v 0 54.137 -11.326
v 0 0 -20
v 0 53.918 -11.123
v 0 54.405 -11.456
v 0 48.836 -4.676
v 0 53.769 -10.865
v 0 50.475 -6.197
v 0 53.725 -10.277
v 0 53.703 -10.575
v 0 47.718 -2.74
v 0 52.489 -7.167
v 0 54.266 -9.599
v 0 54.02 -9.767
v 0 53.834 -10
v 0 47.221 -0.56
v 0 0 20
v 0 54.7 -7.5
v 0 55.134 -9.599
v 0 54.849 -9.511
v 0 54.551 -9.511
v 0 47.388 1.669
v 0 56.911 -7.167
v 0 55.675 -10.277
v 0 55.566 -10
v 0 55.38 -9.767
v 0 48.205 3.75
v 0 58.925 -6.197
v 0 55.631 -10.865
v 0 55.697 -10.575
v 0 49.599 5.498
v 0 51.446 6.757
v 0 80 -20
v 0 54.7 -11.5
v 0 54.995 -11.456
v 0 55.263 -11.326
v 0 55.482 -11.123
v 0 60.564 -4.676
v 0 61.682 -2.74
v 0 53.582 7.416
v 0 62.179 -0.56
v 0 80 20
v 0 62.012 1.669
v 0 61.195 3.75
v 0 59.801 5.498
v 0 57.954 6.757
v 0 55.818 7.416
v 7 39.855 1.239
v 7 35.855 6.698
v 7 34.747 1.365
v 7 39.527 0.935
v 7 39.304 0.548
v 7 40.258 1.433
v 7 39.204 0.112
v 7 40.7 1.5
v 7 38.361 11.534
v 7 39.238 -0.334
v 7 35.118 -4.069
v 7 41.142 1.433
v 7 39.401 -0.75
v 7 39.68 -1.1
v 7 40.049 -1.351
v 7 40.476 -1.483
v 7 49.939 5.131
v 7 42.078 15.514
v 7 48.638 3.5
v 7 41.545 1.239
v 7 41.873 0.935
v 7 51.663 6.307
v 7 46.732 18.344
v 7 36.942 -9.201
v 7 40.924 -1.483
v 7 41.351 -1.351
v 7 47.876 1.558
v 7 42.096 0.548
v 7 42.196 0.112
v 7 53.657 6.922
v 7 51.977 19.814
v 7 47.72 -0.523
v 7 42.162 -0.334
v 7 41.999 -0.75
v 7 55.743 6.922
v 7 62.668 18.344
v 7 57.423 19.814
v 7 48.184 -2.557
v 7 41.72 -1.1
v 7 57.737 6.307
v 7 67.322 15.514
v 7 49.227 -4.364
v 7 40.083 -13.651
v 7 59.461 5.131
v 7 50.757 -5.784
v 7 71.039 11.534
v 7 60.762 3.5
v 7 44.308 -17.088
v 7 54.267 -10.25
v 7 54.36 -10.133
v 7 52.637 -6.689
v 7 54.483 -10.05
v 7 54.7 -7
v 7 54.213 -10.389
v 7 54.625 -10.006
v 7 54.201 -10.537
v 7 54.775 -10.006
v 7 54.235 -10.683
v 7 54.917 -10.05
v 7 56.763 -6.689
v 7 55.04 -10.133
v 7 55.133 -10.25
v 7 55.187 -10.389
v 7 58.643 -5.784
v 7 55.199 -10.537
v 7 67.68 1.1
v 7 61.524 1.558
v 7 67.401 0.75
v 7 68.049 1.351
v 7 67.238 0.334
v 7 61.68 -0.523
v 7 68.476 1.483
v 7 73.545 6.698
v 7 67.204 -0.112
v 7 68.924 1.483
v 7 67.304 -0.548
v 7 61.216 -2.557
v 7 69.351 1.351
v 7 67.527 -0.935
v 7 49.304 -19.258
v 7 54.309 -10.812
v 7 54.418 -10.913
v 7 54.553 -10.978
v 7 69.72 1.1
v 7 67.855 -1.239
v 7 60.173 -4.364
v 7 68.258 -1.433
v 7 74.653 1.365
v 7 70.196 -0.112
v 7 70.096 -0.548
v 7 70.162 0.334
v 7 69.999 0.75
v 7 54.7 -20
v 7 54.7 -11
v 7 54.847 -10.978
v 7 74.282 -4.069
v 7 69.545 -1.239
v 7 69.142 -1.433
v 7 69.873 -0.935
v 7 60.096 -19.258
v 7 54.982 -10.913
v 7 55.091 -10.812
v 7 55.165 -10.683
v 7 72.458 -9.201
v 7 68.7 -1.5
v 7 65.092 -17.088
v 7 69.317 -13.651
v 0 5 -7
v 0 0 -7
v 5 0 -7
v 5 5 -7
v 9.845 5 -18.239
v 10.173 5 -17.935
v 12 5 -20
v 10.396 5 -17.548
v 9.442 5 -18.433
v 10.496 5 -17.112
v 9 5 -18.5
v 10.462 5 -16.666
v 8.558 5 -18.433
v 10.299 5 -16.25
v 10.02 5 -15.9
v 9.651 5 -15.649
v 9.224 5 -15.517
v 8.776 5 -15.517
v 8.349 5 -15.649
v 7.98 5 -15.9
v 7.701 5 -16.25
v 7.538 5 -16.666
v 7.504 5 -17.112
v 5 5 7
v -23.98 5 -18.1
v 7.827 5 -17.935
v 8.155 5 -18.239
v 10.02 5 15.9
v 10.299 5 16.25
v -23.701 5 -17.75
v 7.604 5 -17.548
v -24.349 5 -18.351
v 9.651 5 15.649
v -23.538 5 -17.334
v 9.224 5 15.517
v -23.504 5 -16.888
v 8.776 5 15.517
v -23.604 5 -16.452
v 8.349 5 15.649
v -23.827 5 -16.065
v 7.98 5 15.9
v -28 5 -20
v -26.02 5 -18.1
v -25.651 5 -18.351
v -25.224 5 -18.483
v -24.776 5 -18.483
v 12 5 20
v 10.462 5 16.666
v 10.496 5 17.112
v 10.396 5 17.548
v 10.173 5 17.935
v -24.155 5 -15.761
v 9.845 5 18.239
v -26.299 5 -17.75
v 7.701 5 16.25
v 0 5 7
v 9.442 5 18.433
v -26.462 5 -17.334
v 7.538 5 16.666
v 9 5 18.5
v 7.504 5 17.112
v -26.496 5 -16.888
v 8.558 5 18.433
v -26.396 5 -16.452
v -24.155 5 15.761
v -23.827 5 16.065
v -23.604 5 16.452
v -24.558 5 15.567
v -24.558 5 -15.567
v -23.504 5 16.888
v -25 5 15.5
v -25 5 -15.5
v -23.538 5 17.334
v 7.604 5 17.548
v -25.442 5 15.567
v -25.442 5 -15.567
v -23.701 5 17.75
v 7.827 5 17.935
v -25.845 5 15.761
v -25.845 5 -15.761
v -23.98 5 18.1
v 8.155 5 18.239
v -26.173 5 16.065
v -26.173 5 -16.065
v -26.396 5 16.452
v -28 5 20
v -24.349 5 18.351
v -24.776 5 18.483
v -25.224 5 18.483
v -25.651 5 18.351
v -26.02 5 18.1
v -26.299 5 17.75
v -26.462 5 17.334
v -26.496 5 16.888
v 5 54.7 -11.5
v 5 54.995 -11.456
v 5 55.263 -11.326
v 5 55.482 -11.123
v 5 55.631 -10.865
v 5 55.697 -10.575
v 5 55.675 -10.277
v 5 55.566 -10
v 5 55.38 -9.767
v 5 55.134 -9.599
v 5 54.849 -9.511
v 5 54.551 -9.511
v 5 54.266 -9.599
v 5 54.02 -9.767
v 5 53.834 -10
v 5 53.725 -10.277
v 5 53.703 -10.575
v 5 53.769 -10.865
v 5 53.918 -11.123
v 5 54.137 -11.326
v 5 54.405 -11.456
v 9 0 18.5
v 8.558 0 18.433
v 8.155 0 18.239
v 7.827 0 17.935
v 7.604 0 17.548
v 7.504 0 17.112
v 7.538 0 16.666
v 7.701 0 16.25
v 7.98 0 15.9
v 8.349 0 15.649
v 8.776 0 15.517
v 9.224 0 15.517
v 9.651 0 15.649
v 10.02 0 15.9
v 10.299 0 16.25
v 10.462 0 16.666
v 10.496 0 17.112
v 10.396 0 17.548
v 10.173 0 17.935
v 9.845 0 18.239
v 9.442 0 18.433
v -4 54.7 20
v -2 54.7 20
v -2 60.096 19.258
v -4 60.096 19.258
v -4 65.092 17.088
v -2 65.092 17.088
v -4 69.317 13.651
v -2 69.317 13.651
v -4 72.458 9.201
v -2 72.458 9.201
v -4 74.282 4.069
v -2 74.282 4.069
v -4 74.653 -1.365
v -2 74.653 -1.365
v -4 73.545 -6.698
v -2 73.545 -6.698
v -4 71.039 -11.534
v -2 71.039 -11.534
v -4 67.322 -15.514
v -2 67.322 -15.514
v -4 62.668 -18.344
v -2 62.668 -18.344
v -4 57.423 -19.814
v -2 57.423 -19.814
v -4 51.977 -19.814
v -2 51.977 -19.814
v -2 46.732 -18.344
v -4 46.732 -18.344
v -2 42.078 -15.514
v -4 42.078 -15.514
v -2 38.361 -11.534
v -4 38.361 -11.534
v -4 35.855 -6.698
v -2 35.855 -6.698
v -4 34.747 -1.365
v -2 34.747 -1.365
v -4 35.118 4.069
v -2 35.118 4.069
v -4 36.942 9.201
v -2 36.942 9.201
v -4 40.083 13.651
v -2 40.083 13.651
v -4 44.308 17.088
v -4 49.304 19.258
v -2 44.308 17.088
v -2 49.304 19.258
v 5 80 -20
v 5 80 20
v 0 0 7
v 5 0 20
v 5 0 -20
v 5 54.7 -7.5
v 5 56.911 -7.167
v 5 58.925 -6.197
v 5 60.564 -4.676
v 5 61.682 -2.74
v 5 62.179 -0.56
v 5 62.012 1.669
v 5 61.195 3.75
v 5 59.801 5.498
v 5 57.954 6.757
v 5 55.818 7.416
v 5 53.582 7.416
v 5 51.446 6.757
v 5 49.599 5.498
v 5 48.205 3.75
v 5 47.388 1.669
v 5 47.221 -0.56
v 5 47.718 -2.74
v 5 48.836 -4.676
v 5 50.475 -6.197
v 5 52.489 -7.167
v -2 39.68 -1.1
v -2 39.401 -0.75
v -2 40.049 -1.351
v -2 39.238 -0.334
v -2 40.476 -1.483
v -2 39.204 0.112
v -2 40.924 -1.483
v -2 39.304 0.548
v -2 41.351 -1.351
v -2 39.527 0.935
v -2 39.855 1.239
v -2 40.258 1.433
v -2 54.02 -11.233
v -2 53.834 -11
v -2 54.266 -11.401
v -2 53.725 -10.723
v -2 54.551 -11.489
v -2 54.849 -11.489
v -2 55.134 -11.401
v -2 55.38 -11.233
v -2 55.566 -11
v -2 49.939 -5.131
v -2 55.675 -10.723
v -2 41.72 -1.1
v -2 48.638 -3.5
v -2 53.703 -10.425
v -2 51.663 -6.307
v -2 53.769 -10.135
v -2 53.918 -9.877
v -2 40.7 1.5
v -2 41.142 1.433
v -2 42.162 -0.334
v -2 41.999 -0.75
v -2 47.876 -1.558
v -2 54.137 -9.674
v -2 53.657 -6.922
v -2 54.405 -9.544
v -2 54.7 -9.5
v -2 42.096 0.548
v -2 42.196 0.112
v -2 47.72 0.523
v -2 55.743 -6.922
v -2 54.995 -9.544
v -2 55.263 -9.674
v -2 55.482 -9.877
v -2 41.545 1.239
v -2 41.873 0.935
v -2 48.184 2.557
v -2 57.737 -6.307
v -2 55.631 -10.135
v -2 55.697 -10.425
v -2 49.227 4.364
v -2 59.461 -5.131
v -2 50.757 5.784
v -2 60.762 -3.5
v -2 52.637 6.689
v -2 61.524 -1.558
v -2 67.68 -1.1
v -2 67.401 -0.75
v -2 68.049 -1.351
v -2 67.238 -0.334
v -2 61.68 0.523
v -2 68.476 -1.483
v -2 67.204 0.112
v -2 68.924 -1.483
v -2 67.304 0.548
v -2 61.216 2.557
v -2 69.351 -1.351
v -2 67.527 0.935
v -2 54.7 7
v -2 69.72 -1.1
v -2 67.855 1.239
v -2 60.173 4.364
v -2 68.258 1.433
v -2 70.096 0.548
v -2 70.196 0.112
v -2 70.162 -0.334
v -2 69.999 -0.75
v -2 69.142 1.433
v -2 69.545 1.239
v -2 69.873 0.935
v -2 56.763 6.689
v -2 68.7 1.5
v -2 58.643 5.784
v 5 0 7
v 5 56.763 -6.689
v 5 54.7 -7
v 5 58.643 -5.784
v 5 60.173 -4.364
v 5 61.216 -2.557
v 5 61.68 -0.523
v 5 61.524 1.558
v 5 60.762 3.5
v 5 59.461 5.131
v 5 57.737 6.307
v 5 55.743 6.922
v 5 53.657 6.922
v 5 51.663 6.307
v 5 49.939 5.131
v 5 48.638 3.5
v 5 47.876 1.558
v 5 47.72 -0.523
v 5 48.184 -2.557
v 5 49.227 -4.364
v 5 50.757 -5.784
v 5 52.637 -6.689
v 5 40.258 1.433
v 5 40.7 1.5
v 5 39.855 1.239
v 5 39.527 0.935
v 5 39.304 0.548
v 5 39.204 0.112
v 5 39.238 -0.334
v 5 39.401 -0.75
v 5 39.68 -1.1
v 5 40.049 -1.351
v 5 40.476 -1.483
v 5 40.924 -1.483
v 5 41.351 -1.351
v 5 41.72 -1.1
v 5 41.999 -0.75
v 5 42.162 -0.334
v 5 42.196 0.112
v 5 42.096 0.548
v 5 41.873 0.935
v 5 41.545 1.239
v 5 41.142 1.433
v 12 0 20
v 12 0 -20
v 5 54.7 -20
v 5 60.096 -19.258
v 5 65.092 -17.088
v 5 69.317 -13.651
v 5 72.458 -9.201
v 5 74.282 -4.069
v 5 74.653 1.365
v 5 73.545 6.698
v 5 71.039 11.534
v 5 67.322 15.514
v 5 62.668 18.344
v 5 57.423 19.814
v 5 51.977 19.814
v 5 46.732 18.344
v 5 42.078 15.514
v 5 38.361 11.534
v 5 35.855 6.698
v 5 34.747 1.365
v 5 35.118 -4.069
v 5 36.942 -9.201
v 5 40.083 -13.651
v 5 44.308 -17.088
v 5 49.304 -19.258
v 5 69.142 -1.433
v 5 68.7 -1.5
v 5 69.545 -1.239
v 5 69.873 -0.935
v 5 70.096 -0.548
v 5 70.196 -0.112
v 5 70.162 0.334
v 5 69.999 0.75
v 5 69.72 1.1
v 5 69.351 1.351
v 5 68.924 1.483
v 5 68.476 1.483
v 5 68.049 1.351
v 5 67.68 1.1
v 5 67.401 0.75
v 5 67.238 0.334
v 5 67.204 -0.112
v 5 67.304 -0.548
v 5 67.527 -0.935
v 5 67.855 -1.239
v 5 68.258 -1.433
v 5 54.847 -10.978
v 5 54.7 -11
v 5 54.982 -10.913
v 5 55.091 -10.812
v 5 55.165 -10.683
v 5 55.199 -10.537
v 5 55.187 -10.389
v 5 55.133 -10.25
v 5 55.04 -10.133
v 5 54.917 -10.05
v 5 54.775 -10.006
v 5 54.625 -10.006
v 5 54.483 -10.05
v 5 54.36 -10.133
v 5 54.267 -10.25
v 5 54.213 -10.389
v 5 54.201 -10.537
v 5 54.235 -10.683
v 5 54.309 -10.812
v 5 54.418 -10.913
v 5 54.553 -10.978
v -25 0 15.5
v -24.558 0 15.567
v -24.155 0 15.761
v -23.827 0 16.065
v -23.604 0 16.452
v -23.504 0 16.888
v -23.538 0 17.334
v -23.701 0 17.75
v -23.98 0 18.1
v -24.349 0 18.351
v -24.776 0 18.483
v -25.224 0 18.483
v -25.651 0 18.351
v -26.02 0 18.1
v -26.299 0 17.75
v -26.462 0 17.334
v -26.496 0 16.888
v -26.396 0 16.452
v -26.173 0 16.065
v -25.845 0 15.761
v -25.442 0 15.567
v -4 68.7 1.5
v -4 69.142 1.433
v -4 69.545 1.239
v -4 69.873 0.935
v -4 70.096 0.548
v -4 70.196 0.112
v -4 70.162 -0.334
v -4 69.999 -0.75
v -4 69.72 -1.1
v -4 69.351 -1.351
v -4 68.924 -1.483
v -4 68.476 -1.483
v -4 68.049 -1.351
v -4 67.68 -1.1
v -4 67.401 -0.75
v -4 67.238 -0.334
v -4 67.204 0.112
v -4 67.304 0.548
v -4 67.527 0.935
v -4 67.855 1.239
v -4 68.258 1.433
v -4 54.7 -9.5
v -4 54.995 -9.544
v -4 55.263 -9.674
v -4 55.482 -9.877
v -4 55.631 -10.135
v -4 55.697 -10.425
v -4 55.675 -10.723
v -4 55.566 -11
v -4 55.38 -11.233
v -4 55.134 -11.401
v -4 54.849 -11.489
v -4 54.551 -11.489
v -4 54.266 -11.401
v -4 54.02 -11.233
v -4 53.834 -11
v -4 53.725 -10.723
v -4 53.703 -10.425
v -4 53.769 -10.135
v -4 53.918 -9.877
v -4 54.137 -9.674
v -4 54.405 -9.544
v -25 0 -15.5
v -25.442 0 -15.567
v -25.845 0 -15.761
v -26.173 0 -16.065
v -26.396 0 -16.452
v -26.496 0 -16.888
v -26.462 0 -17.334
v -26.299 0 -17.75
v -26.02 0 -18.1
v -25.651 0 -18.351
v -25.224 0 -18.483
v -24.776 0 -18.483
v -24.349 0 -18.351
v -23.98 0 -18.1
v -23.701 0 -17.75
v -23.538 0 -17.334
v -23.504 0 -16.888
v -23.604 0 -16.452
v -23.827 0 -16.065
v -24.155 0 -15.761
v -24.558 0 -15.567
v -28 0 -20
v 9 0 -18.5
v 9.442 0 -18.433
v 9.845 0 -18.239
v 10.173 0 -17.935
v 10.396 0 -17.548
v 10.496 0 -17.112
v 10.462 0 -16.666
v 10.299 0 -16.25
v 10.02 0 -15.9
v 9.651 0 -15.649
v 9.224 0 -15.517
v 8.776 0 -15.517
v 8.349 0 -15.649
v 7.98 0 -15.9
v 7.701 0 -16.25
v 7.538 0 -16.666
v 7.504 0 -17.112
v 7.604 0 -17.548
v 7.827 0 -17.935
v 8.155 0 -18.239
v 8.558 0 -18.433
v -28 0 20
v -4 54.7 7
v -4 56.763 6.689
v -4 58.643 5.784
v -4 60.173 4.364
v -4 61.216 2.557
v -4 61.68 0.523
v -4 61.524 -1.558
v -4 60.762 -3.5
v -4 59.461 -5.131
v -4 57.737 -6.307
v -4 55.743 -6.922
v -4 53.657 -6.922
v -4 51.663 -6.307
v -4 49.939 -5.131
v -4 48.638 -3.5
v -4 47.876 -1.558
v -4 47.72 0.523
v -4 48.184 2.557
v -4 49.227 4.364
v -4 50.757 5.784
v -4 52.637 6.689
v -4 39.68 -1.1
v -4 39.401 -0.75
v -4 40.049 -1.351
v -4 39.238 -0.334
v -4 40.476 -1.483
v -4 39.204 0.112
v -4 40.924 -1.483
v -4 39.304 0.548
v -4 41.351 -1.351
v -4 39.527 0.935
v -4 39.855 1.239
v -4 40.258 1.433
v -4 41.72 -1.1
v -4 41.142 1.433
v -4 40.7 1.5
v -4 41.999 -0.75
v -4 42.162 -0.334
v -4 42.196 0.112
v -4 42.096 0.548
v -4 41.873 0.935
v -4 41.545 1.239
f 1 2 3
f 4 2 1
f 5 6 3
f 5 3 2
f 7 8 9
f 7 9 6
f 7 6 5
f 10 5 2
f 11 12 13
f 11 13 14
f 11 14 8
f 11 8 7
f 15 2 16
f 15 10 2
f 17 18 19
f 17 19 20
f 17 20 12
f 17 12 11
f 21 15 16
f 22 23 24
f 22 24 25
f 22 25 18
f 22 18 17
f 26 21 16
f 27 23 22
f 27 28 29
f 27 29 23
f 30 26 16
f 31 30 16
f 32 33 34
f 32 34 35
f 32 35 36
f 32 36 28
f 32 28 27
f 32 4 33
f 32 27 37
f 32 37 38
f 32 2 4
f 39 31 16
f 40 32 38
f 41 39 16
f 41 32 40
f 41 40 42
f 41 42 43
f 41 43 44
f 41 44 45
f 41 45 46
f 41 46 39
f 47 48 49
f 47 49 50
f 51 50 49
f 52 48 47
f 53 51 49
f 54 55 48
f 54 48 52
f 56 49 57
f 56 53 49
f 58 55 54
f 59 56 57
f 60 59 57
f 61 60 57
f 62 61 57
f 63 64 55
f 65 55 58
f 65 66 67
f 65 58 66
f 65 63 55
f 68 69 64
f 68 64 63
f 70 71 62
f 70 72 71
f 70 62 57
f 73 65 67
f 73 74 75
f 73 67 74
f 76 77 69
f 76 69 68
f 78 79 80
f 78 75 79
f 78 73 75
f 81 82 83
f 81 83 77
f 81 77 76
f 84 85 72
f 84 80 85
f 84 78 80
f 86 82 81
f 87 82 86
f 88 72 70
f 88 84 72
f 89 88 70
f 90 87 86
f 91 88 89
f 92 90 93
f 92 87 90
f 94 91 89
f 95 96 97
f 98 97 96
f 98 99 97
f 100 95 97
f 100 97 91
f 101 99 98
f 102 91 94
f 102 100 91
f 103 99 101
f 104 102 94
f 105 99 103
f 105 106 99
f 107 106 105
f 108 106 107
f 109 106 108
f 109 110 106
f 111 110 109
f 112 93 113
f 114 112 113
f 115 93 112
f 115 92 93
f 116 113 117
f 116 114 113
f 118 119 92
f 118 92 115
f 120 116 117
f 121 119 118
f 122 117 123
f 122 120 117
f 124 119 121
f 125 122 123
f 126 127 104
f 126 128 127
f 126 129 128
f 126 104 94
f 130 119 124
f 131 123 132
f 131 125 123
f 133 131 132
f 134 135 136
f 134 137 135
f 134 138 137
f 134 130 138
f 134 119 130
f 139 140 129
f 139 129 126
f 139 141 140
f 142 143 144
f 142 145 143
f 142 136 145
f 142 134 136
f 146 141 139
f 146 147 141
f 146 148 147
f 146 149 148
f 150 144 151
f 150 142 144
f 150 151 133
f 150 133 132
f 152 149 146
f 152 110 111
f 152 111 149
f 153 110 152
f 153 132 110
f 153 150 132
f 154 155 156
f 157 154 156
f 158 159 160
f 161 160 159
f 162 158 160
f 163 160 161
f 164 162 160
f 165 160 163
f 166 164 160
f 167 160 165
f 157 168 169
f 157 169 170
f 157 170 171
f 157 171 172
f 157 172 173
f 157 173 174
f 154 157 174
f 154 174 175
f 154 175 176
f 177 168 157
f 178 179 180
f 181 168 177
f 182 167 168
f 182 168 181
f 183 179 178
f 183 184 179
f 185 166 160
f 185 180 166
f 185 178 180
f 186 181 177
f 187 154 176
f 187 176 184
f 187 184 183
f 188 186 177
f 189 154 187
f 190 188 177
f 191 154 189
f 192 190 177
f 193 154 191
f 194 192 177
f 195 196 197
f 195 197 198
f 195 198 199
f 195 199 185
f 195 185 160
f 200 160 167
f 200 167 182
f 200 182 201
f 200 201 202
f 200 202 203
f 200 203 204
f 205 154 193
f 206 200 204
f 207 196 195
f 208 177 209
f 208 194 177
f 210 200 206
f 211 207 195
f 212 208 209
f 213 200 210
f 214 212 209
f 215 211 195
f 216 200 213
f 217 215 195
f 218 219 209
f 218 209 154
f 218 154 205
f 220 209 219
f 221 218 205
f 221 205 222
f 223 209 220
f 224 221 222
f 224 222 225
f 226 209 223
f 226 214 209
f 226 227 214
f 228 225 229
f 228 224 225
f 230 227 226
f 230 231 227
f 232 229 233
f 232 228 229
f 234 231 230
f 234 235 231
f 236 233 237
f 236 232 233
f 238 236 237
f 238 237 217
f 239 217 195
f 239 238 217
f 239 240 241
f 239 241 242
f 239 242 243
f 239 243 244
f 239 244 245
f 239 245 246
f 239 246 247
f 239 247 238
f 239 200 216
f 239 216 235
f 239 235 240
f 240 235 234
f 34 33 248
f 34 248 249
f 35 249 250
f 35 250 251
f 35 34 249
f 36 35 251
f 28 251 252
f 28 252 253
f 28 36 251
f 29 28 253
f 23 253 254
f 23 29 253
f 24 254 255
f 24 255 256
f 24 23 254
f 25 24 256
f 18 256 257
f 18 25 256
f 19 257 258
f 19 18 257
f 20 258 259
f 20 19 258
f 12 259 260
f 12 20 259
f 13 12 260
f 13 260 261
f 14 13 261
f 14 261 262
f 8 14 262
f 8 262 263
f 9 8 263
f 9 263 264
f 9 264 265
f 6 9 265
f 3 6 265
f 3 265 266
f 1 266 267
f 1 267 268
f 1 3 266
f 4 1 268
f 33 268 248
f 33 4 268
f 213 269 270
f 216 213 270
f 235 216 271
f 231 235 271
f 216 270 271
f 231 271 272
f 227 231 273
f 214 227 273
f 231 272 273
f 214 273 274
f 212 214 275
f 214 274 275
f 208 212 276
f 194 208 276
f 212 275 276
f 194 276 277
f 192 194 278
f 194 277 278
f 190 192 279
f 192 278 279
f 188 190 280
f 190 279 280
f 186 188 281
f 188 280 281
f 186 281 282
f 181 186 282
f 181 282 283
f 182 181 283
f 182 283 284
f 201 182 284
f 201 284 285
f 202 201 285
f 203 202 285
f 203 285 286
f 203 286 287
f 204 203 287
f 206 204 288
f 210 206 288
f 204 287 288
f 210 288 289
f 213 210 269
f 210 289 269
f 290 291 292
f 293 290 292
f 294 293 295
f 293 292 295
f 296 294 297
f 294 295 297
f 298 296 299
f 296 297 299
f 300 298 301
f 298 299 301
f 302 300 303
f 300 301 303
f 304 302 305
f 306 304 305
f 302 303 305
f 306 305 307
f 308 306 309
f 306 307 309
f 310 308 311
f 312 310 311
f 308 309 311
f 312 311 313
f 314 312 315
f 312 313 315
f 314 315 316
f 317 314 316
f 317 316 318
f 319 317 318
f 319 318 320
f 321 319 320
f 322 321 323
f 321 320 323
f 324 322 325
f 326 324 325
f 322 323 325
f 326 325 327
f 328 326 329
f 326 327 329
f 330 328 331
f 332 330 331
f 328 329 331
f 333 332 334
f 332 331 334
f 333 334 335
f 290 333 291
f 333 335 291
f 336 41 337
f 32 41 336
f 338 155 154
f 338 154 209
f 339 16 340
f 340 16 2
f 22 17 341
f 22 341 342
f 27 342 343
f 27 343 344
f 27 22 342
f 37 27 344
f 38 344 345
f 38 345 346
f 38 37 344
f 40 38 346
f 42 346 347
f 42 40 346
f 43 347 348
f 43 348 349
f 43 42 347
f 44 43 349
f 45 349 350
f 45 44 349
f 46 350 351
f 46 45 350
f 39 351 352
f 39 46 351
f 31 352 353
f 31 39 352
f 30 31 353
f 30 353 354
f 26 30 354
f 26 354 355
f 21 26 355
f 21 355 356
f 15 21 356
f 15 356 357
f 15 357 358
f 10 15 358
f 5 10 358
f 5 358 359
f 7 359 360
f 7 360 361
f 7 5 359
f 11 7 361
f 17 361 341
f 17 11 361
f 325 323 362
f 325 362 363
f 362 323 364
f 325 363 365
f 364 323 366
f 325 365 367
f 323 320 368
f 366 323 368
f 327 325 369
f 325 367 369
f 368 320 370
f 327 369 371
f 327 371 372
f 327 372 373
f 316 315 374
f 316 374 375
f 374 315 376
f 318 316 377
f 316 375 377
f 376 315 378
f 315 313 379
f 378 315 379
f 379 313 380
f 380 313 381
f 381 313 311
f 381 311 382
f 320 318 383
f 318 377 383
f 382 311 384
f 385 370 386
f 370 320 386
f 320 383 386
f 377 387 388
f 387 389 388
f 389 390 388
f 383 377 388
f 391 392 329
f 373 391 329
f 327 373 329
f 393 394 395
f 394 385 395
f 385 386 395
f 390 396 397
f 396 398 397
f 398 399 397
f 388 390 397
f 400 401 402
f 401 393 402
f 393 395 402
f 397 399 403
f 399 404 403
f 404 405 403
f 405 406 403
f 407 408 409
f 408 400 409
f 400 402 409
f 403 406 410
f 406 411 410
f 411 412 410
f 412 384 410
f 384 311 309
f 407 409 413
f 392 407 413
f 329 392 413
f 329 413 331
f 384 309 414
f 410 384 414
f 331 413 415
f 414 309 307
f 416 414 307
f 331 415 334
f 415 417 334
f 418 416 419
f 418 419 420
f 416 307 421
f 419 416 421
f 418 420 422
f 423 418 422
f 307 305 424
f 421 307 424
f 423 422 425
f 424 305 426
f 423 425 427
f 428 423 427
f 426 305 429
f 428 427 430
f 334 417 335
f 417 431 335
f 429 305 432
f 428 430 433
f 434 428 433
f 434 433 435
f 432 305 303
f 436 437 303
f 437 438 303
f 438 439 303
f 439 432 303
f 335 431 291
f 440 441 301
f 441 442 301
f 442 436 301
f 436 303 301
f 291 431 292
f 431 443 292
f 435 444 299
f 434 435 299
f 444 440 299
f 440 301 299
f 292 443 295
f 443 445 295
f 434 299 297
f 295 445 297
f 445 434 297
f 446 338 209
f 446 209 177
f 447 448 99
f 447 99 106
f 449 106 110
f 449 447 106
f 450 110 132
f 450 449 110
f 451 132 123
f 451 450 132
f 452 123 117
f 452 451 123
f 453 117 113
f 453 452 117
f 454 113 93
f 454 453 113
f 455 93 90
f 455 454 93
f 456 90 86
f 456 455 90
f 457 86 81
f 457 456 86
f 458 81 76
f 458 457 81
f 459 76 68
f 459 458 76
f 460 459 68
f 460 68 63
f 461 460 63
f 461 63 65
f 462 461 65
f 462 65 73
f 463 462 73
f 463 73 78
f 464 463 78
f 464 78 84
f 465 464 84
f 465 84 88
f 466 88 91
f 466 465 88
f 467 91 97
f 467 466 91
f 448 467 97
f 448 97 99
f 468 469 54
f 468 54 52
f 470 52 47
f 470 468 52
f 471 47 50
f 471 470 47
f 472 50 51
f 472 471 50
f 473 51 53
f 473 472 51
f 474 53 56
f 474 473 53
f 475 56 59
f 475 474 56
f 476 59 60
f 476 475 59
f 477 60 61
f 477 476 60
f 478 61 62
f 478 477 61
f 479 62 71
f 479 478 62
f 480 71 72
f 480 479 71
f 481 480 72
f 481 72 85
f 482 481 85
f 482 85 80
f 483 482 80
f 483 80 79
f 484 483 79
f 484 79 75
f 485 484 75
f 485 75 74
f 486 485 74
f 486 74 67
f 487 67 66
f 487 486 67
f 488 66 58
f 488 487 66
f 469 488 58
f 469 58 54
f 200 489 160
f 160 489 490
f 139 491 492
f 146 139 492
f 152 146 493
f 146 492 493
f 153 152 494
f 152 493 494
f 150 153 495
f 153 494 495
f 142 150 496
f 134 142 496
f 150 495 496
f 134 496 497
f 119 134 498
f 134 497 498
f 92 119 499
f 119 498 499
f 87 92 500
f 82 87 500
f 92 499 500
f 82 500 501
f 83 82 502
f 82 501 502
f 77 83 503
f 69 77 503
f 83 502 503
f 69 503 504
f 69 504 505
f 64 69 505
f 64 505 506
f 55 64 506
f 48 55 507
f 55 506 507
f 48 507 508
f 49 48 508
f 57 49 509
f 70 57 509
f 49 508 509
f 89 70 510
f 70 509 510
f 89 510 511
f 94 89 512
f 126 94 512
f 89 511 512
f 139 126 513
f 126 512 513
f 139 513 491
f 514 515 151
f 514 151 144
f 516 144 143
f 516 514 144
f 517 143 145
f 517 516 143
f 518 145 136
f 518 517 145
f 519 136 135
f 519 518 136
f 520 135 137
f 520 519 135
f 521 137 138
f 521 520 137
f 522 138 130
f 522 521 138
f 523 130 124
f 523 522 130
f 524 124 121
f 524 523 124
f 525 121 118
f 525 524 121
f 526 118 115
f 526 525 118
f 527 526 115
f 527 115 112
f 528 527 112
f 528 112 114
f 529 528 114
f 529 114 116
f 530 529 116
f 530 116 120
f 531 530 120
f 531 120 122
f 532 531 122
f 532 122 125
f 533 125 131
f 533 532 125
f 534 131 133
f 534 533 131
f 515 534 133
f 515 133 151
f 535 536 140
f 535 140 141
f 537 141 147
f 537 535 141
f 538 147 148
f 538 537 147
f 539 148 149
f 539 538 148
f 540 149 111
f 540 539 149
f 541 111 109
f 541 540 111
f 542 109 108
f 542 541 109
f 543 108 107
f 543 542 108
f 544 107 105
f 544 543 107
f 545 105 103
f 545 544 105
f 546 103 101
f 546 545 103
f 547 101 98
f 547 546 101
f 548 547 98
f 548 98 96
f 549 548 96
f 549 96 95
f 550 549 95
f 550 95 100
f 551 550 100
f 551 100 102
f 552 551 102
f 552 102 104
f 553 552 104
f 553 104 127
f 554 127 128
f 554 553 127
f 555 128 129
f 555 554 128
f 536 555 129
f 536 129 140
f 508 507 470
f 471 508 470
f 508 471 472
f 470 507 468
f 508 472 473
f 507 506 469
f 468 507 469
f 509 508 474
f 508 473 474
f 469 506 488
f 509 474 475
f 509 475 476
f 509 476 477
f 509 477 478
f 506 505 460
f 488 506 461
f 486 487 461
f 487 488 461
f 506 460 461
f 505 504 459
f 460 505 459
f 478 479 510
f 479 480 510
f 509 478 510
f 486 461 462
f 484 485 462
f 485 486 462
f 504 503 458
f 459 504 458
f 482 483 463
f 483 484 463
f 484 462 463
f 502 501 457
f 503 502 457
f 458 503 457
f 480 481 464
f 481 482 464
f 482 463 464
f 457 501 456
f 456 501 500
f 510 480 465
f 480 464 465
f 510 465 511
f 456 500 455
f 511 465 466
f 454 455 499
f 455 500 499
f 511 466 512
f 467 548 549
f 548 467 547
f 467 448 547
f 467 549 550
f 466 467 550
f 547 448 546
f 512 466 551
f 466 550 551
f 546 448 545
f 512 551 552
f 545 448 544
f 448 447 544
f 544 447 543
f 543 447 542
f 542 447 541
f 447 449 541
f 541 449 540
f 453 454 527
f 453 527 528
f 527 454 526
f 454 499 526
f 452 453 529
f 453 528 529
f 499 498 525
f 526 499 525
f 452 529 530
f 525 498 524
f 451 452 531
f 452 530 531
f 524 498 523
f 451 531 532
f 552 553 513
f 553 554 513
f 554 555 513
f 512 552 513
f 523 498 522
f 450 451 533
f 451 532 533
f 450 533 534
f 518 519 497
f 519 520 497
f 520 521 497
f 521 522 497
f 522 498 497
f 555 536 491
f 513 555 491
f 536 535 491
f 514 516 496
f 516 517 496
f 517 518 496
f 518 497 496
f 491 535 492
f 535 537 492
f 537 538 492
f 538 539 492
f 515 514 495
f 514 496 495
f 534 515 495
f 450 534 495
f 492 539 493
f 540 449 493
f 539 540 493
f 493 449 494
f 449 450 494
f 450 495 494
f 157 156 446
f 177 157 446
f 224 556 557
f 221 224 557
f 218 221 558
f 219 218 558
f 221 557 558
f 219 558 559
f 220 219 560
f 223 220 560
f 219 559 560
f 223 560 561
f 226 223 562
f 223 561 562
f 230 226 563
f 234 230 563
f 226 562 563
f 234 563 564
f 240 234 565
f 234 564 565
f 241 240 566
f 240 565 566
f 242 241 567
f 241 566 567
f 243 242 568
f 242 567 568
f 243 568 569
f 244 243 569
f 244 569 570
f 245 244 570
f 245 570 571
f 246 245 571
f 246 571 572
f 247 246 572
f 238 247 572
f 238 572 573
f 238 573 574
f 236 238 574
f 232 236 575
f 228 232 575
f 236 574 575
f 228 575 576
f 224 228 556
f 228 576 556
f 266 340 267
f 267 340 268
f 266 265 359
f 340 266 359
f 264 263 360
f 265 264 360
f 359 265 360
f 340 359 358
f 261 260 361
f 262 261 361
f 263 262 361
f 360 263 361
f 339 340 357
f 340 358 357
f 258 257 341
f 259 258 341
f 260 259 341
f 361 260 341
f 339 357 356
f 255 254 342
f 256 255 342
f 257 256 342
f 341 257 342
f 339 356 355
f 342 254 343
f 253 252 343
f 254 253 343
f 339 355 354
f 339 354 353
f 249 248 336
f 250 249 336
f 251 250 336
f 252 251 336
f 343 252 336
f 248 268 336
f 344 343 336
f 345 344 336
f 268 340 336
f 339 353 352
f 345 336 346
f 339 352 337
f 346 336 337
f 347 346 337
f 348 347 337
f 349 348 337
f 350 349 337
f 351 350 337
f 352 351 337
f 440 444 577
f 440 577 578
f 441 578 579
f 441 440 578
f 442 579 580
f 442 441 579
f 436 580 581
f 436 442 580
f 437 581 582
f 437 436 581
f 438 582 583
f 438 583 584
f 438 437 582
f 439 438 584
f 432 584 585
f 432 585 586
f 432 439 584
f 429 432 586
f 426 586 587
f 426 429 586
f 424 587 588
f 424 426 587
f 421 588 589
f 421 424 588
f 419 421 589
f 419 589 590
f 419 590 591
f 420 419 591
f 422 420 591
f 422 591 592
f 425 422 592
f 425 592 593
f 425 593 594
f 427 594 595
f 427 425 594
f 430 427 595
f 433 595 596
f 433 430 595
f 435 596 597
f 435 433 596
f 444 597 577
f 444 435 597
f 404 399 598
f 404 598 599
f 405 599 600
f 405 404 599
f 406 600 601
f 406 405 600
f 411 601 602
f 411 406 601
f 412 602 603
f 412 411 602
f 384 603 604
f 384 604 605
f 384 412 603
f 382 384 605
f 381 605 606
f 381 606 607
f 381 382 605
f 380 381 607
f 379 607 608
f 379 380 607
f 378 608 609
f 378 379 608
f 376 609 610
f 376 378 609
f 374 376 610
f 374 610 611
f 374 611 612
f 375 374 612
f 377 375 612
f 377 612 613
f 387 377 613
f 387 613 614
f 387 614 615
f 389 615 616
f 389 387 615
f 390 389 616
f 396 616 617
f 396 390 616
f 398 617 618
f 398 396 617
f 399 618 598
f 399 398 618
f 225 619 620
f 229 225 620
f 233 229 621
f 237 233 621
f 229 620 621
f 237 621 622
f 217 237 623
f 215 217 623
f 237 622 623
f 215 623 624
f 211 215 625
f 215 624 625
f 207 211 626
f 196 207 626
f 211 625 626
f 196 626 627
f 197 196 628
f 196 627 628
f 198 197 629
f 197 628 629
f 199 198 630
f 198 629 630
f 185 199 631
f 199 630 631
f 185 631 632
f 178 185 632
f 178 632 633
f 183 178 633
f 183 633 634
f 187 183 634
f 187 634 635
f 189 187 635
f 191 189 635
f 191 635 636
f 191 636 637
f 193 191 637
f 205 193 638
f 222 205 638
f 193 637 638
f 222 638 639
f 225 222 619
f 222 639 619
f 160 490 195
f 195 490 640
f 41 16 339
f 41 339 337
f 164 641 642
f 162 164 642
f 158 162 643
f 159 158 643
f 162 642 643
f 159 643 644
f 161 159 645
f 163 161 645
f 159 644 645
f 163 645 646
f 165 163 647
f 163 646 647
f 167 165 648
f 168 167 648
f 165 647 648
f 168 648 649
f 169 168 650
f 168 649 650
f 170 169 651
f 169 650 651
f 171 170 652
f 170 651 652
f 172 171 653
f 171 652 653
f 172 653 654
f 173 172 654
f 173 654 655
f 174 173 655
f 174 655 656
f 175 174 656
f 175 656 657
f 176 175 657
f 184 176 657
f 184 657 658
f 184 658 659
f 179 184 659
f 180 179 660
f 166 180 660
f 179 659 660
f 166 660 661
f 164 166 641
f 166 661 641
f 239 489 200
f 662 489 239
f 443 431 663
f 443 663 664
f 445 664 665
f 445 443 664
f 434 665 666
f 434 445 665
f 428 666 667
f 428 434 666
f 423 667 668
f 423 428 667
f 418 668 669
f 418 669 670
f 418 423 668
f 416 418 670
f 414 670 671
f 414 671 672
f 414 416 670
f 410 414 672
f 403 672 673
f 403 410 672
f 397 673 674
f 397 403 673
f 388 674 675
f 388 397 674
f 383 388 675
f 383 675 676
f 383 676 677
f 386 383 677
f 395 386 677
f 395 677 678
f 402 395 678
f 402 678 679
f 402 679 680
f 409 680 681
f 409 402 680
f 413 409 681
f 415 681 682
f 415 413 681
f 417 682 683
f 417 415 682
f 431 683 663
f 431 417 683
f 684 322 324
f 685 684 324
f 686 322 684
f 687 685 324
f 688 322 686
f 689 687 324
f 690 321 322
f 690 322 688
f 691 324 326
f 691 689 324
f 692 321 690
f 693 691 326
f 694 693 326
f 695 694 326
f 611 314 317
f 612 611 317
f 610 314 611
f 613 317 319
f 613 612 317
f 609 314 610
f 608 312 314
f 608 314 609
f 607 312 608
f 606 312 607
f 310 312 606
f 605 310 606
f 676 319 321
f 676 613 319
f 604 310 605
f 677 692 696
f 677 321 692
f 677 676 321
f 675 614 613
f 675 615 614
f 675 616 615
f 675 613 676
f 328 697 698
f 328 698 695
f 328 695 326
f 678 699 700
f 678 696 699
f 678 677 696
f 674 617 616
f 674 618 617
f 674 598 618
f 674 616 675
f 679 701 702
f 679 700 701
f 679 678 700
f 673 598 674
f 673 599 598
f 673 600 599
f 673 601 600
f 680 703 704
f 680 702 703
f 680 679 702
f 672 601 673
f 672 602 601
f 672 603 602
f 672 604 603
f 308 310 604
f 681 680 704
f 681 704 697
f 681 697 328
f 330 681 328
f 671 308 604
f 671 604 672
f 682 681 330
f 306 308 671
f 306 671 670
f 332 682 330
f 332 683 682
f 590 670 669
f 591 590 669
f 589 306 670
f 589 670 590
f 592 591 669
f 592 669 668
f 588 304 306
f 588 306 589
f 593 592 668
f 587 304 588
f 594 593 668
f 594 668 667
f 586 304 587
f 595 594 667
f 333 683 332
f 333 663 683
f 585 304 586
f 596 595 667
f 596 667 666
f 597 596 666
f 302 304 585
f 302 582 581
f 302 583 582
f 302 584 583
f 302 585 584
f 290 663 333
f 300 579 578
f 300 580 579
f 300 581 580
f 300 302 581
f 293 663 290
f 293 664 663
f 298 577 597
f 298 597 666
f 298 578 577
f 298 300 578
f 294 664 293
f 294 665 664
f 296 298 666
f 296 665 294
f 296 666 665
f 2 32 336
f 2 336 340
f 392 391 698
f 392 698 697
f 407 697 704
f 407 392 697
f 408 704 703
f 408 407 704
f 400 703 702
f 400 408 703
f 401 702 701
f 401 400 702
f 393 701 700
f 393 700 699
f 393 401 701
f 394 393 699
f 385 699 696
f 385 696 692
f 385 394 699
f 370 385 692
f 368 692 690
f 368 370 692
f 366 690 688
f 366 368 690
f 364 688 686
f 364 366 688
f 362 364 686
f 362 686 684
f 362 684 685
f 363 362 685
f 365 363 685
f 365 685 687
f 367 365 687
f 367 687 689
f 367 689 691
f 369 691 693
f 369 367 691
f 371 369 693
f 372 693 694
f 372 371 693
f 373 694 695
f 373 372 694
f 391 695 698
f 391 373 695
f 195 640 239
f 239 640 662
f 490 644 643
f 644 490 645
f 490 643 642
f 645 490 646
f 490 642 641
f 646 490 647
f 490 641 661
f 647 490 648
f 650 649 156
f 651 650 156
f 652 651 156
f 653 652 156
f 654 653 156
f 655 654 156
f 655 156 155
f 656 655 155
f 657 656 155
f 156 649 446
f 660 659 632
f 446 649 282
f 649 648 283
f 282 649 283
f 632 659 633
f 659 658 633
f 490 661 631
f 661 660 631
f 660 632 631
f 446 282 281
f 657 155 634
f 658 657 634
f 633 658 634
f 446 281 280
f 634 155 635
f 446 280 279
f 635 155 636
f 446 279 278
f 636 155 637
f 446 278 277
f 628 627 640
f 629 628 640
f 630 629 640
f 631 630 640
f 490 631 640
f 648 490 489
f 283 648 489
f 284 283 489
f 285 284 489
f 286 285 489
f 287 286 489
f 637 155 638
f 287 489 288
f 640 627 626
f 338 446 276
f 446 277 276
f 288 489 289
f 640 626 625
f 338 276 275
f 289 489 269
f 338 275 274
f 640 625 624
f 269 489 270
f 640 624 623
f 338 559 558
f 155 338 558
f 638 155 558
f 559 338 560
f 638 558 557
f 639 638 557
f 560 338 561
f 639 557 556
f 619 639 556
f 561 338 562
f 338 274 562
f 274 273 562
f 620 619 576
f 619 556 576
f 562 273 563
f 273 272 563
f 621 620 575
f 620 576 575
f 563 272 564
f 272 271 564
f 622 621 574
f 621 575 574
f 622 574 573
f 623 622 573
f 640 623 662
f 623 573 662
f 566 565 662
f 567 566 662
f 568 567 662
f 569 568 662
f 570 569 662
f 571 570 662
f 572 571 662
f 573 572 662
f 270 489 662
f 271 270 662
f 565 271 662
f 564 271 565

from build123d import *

# Parameters (mm, degrees)
SKETCH1_R           = 7.5
SKETCH1_R_2         = 1
BOSS_EXTRUDE1_DEPTH = 5
SKETCH2_R           = 20
SKETCH2_R_2         = 7
SKETCH2_R_3         = 0.5
SKETCH2_R_4         = 1.5
BOSS_EXTRUDE2_DEPTH = 2
SKETCH4_R           = 20
SKETCH4_R_2         = 1
SKETCH4_R_3         = 1.5
SKETCH4_R_4         = 7
BOSS_EXTRUDE3_DEPTH = 2
SKETCH6_R           = 1.5
SKETCH6_W           = 5
SKETCH6_H           = 14
BOSS_EXTRUDE4_DEPTH = 5


with BuildPart() as part:
    # Sketch1 → Boss-Extrude1 (new body)
    with BuildSketch(Plane(origin=(0, 0, 0), x_dir=(0, 0, -1), z_dir=(1, 0, 0))):
        Polygon((0, 0), (-20, 0), (-20, 80), (20, 80), (20, 0), align=None)
        with Locations((0, 54.7)):
            Circle(SKETCH1_R, mode=Mode.SUBTRACT)
        with Locations((10.5, 54.7)):
            Circle(SKETCH1_R_2, mode=Mode.SUBTRACT)
    extrude(amount=BOSS_EXTRUDE1_DEPTH)


with BuildPart() as body_2:
    # Sketch2 → Boss-Extrude2 (new body)
    with BuildSketch(Plane(origin=(5, 0, 0), x_dir=(0, 0, -1), z_dir=(1, 0, 0))):
        with Locations((0, 54.7)):
            Circle(SKETCH2_R)
        with Locations((0, 54.7)):
            Circle(SKETCH2_R_2, mode=Mode.SUBTRACT)
        with Locations((10.5, 54.7)):
            Circle(SKETCH2_R_3, mode=Mode.SUBTRACT)
        with Locations((0, 68.7)):
            Circle(SKETCH2_R_4, mode=Mode.SUBTRACT)
        with Locations(Location((0, 40.7, 0), (0, 0, 180))):
            Circle(SKETCH2_R_4, mode=Mode.SUBTRACT)
    extrude(amount=BOSS_EXTRUDE2_DEPTH)


with BuildPart() as body_3:
    # Sketch4 → Boss-Extrude3 (new body)
    with BuildSketch(Plane.ZY.offset(2)):
        with Locations((0, 54.7)):
            Circle(SKETCH4_R)
        with Locations((-10.5, 54.7)):
            Circle(SKETCH4_R_2, mode=Mode.SUBTRACT)
        with Locations((0, 40.7)):
            Circle(SKETCH4_R_3, mode=Mode.SUBTRACT)
        with Locations((0, 68.7)):
            Circle(SKETCH4_R_3, mode=Mode.SUBTRACT)
        with Locations((0, 54.7)):
            Circle(SKETCH4_R_4, mode=Mode.SUBTRACT)
    extrude(amount=BOSS_EXTRUDE3_DEPTH)


with BuildPart() as body_4:
    # Sketch6 → Boss-Extrude4 (new body)
    with BuildSketch(Plane.XZ):
        Polygon((0, 20), (12, 20), (12, -20), (-28, -20), (-28, 20), align=None)
        with Locations(Location((-25, 17, 0), (0, 0, 270))):
            Circle(SKETCH6_R, mode=Mode.SUBTRACT)
        with Locations(Location((-25, -17, 0), (0, 0, 90))):
            Circle(SKETCH6_R, mode=Mode.SUBTRACT)
        with Locations(Location((9, -17, 0), (0, 0, 270))):
            Circle(SKETCH6_R, mode=Mode.SUBTRACT)
        with Locations(Location((9, 17, 0), (0, 0, 90))):
            Circle(SKETCH6_R, mode=Mode.SUBTRACT)
        with Locations((2.5, 0)):
            Rectangle(SKETCH6_W, SKETCH6_H, mode=Mode.SUBTRACT)
    extrude(amount=-BOSS_EXTRUDE4_DEPTH)


solid = Compound([part.part, body_2.part, body_3.part, body_4.part])
